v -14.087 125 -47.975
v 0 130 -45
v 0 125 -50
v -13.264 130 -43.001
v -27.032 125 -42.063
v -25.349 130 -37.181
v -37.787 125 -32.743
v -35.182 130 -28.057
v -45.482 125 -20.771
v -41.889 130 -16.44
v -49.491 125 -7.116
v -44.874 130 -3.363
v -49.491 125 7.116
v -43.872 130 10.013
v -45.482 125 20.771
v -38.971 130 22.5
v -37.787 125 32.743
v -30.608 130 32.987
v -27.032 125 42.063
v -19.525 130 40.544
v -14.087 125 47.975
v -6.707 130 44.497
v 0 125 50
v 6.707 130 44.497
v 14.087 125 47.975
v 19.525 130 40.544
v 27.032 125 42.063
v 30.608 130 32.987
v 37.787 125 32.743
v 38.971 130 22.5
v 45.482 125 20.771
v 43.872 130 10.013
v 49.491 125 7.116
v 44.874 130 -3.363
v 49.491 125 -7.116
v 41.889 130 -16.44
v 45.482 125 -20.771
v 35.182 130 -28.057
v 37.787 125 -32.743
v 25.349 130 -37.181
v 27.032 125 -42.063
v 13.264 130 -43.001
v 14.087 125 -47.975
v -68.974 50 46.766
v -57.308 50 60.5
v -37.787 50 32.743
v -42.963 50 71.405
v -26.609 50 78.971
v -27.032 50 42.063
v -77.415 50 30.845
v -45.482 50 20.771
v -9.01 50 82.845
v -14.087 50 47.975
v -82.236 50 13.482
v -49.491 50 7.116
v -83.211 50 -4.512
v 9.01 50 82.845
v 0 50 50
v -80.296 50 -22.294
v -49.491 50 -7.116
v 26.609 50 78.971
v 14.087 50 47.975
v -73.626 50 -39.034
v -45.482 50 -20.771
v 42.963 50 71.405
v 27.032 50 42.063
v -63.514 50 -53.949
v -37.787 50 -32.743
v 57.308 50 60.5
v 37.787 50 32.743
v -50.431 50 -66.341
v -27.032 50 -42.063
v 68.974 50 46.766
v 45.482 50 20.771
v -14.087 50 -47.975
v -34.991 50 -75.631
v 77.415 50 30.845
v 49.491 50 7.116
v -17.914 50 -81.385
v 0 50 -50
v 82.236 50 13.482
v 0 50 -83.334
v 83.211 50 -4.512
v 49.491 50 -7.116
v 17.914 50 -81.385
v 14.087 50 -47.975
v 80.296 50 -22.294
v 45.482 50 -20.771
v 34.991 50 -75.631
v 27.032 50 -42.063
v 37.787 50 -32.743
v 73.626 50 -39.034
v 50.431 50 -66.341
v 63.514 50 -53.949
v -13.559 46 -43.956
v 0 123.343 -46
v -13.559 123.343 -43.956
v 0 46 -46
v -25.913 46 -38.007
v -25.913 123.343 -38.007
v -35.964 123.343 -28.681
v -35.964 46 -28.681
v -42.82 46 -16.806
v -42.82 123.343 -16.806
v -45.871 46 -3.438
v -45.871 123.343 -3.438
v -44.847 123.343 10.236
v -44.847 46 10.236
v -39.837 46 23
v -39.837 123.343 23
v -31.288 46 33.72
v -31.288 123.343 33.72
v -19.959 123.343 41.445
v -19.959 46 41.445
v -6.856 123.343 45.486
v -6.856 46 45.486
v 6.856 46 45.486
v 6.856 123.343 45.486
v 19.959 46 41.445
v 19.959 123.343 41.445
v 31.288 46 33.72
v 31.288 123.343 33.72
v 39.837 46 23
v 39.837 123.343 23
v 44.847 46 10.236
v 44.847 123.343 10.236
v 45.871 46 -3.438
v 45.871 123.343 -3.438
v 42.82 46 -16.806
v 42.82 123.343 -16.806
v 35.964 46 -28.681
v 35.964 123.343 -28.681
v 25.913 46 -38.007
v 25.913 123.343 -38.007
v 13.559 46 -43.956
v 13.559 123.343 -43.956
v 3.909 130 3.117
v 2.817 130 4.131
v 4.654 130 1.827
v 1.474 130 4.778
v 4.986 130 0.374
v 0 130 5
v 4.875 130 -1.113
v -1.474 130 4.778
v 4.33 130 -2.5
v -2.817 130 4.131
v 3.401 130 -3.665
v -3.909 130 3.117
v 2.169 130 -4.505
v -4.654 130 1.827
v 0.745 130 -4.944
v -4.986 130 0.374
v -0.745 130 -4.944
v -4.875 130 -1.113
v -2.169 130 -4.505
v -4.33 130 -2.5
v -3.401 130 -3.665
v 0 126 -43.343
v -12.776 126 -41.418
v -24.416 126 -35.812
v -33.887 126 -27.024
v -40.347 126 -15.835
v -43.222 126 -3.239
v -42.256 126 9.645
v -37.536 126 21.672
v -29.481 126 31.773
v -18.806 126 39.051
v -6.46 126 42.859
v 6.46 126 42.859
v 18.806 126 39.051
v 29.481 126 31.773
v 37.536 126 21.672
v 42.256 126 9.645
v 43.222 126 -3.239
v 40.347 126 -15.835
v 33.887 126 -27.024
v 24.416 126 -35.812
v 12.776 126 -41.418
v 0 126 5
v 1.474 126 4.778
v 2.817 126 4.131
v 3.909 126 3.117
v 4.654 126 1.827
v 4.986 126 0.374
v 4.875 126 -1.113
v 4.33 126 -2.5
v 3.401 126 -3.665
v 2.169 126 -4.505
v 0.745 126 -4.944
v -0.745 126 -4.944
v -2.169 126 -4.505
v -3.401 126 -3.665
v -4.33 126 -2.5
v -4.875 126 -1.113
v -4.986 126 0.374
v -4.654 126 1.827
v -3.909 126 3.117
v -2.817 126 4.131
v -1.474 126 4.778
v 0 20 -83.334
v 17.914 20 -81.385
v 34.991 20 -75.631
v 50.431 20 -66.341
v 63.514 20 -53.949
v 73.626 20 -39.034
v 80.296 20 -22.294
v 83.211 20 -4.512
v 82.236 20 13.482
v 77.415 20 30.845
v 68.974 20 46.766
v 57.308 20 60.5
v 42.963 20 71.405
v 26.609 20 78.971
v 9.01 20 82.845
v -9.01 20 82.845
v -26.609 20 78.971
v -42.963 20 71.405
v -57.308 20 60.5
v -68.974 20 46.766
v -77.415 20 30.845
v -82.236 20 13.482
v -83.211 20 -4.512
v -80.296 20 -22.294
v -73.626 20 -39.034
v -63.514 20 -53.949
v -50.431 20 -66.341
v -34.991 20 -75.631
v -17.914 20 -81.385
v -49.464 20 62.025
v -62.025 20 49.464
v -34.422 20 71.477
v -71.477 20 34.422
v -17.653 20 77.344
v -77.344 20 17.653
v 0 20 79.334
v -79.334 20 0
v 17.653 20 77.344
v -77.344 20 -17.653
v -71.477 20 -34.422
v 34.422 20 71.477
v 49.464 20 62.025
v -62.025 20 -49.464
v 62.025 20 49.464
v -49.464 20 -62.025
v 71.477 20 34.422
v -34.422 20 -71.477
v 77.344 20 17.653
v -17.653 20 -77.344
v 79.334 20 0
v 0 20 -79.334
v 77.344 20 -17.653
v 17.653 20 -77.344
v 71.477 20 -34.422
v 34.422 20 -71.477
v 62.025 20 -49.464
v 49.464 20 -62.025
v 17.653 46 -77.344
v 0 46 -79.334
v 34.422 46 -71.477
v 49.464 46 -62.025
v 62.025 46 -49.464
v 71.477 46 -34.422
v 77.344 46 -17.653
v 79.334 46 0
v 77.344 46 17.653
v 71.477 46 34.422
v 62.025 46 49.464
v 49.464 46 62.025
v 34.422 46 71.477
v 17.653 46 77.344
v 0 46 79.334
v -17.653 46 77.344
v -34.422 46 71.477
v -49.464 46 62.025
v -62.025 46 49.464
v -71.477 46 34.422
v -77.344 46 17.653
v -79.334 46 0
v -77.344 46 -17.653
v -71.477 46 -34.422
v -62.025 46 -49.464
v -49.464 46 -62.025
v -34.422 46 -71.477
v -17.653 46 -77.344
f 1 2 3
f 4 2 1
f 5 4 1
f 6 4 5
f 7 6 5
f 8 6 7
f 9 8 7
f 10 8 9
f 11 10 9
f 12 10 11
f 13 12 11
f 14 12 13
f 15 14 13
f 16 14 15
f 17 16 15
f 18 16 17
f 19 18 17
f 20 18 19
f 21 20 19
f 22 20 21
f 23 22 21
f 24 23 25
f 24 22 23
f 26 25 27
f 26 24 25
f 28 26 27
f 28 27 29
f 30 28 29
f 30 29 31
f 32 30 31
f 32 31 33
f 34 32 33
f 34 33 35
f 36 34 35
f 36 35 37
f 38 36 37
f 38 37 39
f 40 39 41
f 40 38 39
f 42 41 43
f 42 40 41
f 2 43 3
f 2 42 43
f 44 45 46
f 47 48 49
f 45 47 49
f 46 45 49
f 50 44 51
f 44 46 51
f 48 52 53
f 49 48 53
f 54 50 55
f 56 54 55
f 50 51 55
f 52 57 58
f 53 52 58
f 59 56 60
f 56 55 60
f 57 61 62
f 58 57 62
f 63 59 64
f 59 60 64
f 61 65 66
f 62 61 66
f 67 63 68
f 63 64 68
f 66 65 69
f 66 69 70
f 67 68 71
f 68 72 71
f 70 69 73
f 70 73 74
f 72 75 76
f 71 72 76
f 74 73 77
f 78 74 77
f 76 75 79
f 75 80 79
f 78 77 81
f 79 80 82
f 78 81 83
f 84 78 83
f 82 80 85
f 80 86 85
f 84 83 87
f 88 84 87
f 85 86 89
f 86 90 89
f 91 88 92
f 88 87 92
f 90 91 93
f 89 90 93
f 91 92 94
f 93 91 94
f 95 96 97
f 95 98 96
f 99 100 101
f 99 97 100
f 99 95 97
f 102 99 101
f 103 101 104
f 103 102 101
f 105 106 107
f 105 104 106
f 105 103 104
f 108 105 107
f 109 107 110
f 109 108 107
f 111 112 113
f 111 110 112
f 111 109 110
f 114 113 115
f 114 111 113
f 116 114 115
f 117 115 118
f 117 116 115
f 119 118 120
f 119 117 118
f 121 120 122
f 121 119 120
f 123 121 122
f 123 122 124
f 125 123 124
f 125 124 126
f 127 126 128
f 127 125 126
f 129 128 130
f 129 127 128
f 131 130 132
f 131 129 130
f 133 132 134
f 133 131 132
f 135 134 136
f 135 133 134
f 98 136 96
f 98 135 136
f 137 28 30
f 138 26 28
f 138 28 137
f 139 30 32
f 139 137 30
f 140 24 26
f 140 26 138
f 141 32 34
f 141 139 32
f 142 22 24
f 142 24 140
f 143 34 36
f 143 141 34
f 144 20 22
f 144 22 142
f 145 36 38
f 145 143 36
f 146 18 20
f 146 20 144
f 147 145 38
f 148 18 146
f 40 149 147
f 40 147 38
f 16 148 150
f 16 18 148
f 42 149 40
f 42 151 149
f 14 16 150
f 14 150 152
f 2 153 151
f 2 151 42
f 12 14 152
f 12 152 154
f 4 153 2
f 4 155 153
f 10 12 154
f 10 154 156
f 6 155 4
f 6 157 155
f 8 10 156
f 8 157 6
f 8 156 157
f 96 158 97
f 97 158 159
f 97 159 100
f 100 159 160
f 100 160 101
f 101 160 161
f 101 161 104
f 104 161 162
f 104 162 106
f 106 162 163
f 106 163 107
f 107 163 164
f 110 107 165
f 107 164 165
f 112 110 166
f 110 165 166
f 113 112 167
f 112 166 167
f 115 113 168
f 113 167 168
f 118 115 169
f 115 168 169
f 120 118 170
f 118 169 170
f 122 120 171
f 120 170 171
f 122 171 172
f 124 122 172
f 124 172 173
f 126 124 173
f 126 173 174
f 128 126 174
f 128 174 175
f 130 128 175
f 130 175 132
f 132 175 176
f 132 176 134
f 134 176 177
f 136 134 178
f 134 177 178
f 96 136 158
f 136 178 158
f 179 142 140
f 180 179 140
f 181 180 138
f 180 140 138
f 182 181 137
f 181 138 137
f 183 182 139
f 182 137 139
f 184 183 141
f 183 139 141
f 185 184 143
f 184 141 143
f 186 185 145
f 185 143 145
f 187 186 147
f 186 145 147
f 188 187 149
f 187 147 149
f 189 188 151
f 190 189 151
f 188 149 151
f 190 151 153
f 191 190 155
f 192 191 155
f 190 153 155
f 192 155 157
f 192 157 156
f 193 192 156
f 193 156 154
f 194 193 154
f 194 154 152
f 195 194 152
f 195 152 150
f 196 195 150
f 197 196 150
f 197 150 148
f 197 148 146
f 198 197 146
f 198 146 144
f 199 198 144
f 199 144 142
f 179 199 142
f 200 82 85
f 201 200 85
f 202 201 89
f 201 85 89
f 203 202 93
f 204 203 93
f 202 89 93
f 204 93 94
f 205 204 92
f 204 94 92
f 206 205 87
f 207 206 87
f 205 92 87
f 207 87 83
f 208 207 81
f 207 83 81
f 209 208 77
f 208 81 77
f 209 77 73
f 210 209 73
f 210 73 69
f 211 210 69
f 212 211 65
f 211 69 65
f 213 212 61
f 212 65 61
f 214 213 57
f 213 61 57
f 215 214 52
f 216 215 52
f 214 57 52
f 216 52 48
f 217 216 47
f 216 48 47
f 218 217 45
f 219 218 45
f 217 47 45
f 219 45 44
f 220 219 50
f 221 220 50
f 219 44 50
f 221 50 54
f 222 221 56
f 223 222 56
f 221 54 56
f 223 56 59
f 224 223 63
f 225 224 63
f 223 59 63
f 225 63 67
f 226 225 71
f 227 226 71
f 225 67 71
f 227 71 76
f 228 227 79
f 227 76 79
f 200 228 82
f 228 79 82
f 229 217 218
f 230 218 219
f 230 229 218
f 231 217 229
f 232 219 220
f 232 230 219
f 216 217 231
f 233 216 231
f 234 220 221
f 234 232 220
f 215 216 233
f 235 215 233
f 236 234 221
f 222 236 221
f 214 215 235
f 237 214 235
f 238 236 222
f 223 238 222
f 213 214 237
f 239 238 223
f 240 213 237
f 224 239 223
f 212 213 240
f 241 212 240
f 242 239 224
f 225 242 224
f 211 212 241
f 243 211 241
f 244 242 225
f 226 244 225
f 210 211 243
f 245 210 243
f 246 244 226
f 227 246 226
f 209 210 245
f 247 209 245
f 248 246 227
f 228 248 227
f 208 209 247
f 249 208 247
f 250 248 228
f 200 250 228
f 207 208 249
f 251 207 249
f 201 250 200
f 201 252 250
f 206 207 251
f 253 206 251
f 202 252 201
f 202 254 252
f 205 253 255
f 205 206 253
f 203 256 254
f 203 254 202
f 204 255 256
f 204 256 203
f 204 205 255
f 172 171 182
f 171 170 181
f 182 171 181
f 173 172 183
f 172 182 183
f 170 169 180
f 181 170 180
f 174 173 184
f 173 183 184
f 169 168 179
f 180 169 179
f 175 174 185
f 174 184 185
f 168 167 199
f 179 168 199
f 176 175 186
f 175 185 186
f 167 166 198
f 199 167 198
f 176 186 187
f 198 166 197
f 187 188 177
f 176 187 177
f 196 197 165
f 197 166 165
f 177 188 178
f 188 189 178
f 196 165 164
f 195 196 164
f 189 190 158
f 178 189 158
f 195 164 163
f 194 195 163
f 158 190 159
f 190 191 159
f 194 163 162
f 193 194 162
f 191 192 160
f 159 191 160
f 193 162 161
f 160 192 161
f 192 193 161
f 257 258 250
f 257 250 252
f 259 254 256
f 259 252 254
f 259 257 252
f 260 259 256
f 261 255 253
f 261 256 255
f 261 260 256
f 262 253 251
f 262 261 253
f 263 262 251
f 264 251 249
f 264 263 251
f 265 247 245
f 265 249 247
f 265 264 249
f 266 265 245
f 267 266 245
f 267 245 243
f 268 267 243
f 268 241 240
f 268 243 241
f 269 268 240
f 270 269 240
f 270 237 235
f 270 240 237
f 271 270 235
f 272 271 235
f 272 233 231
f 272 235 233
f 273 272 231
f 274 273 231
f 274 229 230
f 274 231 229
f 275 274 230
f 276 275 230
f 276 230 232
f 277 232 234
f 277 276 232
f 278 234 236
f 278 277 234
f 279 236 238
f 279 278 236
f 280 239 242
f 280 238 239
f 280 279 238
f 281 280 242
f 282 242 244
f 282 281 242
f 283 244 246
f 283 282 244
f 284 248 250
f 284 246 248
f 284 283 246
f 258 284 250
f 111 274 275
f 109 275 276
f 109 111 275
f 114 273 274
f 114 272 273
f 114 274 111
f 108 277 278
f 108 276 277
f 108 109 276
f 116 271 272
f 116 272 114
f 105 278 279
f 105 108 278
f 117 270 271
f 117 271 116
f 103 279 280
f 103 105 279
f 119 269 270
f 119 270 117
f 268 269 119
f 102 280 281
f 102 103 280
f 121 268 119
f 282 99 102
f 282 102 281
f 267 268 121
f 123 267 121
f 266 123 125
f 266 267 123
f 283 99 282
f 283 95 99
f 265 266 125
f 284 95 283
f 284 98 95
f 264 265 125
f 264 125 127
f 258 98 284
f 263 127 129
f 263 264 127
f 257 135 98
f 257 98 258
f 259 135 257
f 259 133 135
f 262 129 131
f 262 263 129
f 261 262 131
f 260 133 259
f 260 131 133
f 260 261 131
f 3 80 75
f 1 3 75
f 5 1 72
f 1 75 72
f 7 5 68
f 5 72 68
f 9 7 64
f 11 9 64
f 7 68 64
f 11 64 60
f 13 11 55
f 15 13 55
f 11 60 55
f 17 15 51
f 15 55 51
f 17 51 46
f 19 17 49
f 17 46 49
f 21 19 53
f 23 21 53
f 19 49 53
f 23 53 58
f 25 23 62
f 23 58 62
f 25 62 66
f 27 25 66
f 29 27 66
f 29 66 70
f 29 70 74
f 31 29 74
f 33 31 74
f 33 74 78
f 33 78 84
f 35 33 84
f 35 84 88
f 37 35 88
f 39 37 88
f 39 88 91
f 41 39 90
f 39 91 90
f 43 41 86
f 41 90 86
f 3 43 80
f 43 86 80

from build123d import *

# Parameters (mm, degrees)
BOSS_EXTRUDE1_DEPTH = 100
SKETCH3_R           = 50
BOSS_EXTRUDE3_DEPTH = 80
CHAMFER1_SIZE       = 5
FILLET1_R           = 1
SKETCH4_R           = 5
CUT_EXTRUDE1_DEPTH  = 20
SKETCH5_R           = 15
SKETCH5_R_2         = 2.5
SKETCH5_W           = 60
SKETCH5_H           = 10
SKETCH5_W_2         = 50
CUT_EXTRUDE2_DEPTH  = 20
SKETCH6_W           = 150
SKETCH6_H           = 200
CUT_EXTRUDE3_DEPTH  = 181
SKETCH7_R           = 83.3335
BOSS_EXTRUDE4_DEPTH = 30
SHELL1_T            = -4
SKETCH10_R          = 5
CUT_EXTRUDE4_DEPTH  = 209


with BuildPart() as part:
    # Sketch2 → Boss-Extrude1 (new, symmetric)
    with BuildSketch(Plane.XY):
        with BuildLine():
            Line((-75, 50), (-70, 50))
            ThreePointArc((-70, 50), (-65, 45), (-60, 50))
            Line((-60, 50), (-35, 50))
            Line((-35, 50), (-25, 50))
            Line((-25, 50), (25, 50))
            Line((25, 50), (35, 50))
            Line((35, 50), (60, 50))
            ThreePointArc((60, 50), (65, 45), (70, 50))
            Line((70, 50), (75, 50))
            Line((75, 50), (75, 15))
            ThreePointArc((75, 15), (70.980762114, 0), (75, -15))
            Line((75, -15), (75, -50))
            Line((75, -50), (70, -50))
            ThreePointArc((70, -50), (65, -45), (60, -50))
            Line((60, -50), (35, -50))
            ThreePointArc((35, -50), (30, -45), (25, -50))
            Line((25, -50), (-25, -50))
            ThreePointArc((-25, -50), (-30, -45), (-35, -50))
            Line((-35, -50), (-60, -50))
            ThreePointArc((-60, -50), (-65, -45), (-70, -50))
            Line((-70, -50), (-75, -50))
            Line((-75, -50), (-75, -15))
            ThreePointArc((-75, -15), (-70.980762114, 0), (-75, 15))
            Line((-75, 15), (-75, 50))
        make_face()
    extrude(amount=BOSS_EXTRUDE1_DEPTH, both=True)

    # Sketch3 → Boss-Extrude3 (add)
    with BuildSketch(Plane(origin=(0, 50, 0), x_dir=(1, 0, 0), z_dir=(0, 1, 0))):
        with Locations(Location((0, 0, 0), (0, 0, 90))):
            Circle(SKETCH3_R)
    extrude(amount=BOSS_EXTRUDE3_DEPTH)

    # Chamfer1
    chamfer1_edges = [part.edges().sort_by_distance(p)[0] for p in [
        (0, 130, 50),
    ]]
    chamfer(chamfer1_edges, length=CHAMFER1_SIZE)

    # Fillet1
    fillet1_edges = [part.edges().sort_by_distance(p)[0] for p in [
        (-75, -50, 0),
        (-75, 50, 0),
        (75, 50, 0),
        (75, -50, 0),
    ]]
    fillet(fillet1_edges, radius=FILLET1_R)

    # Sketch4 → Cut-Extrude1 (cut)
    with BuildSketch(Plane.XZ.offset(50)):
        with Locations(Location((-47.5, 80, 0), (0, 0, 270))):
            Circle(SKETCH4_R)
        with Locations(Location((47.5, 80, 0), (0, 0, 270))):
            Circle(SKETCH4_R)
        with Locations(Location((47.5, 40, 0), (0, 0, 270))):
            Circle(SKETCH4_R)
        with Locations(Location((47.5, 0, 0), (0, 0, 270))):
            Circle(SKETCH4_R)
        with Locations(Location((47.5, -40, 0), (0, 0, 270))):
            Circle(SKETCH4_R)
        with Locations(Location((47.5, -80, 0), (0, 0, 270))):
            Circle(SKETCH4_R)
        with Locations(Location((-47.5, 40, 0), (0, 0, 270))):
            Circle(SKETCH4_R)
        with Locations(Location((-47.5, 0, 0), (0, 0, 270))):
            Circle(SKETCH4_R)
        with Locations(Location((-47.5, -40, 0), (0, 0, 270))):
            Circle(SKETCH4_R)
        with Locations(Location((-47.5, -80, 0), (0, 0, 270))):
            Circle(SKETCH4_R)
    extrude(amount=-CUT_EXTRUDE1_DEPTH, mode=Mode.SUBTRACT)

    # Sketch5 → Cut-Extrude2 (cut)
    with BuildSketch(Plane(origin=(0, 0, -100), x_dir=(-1, 0, 0), z_dir=(0, 0, -1))):
        with Locations((40, 25)):
            Circle(SKETCH5_R)
        with Locations((35, 25)):
            Circle(SKETCH5_R_2, mode=Mode.SUBTRACT)
        with Locations((45, 25)):
            Circle(SKETCH5_R_2, mode=Mode.SUBTRACT)
        with Locations((-25, -20)):
            Rectangle(SKETCH5_W, SKETCH5_H)
        with Locations((-25, 10)):
            Rectangle(SKETCH5_W_2, SKETCH5_H)
    extrude(amount=-CUT_EXTRUDE2_DEPTH, mode=Mode.SUBTRACT)

    # Sketch6 → Cut-Extrude3 (cut)
    with BuildSketch(Plane(origin=(0, 50, 0), x_dir=(1, 0, 0), z_dir=(0, 1, 0))):
        Rectangle(SKETCH6_W, SKETCH6_H)
    extrude(amount=-CUT_EXTRUDE3_DEPTH, mode=Mode.SUBTRACT)

    # Sketch7 → Boss-Extrude4 (add)
    with BuildSketch(Plane.XZ.offset(-50)):
        with Locations(Location((0, 0, 0), (0, 0, 270))):
            Circle(SKETCH7_R)
    extrude(amount=BOSS_EXTRUDE4_DEPTH)

    # Shell1
    shell1_openings = [part.faces().sort_by_distance(p)[0] for p in [
        (0, 20, 0),
    ]]
    offset(amount=SHELL1_T, openings=shell1_openings, kind=Kind.INTERSECTION)

    # Sketch10 → Cut-Extrude4 (cut)
    with BuildSketch(Plane(origin=(0, 130, 0), x_dir=(1, 0, 0), z_dir=(0, 1, 0))):
        with Locations(Location((0, 0, 0), (0, 0, 270))):
            Circle(SKETCH10_R)
    extrude(amount=-CUT_EXTRUDE4_DEPTH, mode=Mode.SUBTRACT)


solid = part.part
